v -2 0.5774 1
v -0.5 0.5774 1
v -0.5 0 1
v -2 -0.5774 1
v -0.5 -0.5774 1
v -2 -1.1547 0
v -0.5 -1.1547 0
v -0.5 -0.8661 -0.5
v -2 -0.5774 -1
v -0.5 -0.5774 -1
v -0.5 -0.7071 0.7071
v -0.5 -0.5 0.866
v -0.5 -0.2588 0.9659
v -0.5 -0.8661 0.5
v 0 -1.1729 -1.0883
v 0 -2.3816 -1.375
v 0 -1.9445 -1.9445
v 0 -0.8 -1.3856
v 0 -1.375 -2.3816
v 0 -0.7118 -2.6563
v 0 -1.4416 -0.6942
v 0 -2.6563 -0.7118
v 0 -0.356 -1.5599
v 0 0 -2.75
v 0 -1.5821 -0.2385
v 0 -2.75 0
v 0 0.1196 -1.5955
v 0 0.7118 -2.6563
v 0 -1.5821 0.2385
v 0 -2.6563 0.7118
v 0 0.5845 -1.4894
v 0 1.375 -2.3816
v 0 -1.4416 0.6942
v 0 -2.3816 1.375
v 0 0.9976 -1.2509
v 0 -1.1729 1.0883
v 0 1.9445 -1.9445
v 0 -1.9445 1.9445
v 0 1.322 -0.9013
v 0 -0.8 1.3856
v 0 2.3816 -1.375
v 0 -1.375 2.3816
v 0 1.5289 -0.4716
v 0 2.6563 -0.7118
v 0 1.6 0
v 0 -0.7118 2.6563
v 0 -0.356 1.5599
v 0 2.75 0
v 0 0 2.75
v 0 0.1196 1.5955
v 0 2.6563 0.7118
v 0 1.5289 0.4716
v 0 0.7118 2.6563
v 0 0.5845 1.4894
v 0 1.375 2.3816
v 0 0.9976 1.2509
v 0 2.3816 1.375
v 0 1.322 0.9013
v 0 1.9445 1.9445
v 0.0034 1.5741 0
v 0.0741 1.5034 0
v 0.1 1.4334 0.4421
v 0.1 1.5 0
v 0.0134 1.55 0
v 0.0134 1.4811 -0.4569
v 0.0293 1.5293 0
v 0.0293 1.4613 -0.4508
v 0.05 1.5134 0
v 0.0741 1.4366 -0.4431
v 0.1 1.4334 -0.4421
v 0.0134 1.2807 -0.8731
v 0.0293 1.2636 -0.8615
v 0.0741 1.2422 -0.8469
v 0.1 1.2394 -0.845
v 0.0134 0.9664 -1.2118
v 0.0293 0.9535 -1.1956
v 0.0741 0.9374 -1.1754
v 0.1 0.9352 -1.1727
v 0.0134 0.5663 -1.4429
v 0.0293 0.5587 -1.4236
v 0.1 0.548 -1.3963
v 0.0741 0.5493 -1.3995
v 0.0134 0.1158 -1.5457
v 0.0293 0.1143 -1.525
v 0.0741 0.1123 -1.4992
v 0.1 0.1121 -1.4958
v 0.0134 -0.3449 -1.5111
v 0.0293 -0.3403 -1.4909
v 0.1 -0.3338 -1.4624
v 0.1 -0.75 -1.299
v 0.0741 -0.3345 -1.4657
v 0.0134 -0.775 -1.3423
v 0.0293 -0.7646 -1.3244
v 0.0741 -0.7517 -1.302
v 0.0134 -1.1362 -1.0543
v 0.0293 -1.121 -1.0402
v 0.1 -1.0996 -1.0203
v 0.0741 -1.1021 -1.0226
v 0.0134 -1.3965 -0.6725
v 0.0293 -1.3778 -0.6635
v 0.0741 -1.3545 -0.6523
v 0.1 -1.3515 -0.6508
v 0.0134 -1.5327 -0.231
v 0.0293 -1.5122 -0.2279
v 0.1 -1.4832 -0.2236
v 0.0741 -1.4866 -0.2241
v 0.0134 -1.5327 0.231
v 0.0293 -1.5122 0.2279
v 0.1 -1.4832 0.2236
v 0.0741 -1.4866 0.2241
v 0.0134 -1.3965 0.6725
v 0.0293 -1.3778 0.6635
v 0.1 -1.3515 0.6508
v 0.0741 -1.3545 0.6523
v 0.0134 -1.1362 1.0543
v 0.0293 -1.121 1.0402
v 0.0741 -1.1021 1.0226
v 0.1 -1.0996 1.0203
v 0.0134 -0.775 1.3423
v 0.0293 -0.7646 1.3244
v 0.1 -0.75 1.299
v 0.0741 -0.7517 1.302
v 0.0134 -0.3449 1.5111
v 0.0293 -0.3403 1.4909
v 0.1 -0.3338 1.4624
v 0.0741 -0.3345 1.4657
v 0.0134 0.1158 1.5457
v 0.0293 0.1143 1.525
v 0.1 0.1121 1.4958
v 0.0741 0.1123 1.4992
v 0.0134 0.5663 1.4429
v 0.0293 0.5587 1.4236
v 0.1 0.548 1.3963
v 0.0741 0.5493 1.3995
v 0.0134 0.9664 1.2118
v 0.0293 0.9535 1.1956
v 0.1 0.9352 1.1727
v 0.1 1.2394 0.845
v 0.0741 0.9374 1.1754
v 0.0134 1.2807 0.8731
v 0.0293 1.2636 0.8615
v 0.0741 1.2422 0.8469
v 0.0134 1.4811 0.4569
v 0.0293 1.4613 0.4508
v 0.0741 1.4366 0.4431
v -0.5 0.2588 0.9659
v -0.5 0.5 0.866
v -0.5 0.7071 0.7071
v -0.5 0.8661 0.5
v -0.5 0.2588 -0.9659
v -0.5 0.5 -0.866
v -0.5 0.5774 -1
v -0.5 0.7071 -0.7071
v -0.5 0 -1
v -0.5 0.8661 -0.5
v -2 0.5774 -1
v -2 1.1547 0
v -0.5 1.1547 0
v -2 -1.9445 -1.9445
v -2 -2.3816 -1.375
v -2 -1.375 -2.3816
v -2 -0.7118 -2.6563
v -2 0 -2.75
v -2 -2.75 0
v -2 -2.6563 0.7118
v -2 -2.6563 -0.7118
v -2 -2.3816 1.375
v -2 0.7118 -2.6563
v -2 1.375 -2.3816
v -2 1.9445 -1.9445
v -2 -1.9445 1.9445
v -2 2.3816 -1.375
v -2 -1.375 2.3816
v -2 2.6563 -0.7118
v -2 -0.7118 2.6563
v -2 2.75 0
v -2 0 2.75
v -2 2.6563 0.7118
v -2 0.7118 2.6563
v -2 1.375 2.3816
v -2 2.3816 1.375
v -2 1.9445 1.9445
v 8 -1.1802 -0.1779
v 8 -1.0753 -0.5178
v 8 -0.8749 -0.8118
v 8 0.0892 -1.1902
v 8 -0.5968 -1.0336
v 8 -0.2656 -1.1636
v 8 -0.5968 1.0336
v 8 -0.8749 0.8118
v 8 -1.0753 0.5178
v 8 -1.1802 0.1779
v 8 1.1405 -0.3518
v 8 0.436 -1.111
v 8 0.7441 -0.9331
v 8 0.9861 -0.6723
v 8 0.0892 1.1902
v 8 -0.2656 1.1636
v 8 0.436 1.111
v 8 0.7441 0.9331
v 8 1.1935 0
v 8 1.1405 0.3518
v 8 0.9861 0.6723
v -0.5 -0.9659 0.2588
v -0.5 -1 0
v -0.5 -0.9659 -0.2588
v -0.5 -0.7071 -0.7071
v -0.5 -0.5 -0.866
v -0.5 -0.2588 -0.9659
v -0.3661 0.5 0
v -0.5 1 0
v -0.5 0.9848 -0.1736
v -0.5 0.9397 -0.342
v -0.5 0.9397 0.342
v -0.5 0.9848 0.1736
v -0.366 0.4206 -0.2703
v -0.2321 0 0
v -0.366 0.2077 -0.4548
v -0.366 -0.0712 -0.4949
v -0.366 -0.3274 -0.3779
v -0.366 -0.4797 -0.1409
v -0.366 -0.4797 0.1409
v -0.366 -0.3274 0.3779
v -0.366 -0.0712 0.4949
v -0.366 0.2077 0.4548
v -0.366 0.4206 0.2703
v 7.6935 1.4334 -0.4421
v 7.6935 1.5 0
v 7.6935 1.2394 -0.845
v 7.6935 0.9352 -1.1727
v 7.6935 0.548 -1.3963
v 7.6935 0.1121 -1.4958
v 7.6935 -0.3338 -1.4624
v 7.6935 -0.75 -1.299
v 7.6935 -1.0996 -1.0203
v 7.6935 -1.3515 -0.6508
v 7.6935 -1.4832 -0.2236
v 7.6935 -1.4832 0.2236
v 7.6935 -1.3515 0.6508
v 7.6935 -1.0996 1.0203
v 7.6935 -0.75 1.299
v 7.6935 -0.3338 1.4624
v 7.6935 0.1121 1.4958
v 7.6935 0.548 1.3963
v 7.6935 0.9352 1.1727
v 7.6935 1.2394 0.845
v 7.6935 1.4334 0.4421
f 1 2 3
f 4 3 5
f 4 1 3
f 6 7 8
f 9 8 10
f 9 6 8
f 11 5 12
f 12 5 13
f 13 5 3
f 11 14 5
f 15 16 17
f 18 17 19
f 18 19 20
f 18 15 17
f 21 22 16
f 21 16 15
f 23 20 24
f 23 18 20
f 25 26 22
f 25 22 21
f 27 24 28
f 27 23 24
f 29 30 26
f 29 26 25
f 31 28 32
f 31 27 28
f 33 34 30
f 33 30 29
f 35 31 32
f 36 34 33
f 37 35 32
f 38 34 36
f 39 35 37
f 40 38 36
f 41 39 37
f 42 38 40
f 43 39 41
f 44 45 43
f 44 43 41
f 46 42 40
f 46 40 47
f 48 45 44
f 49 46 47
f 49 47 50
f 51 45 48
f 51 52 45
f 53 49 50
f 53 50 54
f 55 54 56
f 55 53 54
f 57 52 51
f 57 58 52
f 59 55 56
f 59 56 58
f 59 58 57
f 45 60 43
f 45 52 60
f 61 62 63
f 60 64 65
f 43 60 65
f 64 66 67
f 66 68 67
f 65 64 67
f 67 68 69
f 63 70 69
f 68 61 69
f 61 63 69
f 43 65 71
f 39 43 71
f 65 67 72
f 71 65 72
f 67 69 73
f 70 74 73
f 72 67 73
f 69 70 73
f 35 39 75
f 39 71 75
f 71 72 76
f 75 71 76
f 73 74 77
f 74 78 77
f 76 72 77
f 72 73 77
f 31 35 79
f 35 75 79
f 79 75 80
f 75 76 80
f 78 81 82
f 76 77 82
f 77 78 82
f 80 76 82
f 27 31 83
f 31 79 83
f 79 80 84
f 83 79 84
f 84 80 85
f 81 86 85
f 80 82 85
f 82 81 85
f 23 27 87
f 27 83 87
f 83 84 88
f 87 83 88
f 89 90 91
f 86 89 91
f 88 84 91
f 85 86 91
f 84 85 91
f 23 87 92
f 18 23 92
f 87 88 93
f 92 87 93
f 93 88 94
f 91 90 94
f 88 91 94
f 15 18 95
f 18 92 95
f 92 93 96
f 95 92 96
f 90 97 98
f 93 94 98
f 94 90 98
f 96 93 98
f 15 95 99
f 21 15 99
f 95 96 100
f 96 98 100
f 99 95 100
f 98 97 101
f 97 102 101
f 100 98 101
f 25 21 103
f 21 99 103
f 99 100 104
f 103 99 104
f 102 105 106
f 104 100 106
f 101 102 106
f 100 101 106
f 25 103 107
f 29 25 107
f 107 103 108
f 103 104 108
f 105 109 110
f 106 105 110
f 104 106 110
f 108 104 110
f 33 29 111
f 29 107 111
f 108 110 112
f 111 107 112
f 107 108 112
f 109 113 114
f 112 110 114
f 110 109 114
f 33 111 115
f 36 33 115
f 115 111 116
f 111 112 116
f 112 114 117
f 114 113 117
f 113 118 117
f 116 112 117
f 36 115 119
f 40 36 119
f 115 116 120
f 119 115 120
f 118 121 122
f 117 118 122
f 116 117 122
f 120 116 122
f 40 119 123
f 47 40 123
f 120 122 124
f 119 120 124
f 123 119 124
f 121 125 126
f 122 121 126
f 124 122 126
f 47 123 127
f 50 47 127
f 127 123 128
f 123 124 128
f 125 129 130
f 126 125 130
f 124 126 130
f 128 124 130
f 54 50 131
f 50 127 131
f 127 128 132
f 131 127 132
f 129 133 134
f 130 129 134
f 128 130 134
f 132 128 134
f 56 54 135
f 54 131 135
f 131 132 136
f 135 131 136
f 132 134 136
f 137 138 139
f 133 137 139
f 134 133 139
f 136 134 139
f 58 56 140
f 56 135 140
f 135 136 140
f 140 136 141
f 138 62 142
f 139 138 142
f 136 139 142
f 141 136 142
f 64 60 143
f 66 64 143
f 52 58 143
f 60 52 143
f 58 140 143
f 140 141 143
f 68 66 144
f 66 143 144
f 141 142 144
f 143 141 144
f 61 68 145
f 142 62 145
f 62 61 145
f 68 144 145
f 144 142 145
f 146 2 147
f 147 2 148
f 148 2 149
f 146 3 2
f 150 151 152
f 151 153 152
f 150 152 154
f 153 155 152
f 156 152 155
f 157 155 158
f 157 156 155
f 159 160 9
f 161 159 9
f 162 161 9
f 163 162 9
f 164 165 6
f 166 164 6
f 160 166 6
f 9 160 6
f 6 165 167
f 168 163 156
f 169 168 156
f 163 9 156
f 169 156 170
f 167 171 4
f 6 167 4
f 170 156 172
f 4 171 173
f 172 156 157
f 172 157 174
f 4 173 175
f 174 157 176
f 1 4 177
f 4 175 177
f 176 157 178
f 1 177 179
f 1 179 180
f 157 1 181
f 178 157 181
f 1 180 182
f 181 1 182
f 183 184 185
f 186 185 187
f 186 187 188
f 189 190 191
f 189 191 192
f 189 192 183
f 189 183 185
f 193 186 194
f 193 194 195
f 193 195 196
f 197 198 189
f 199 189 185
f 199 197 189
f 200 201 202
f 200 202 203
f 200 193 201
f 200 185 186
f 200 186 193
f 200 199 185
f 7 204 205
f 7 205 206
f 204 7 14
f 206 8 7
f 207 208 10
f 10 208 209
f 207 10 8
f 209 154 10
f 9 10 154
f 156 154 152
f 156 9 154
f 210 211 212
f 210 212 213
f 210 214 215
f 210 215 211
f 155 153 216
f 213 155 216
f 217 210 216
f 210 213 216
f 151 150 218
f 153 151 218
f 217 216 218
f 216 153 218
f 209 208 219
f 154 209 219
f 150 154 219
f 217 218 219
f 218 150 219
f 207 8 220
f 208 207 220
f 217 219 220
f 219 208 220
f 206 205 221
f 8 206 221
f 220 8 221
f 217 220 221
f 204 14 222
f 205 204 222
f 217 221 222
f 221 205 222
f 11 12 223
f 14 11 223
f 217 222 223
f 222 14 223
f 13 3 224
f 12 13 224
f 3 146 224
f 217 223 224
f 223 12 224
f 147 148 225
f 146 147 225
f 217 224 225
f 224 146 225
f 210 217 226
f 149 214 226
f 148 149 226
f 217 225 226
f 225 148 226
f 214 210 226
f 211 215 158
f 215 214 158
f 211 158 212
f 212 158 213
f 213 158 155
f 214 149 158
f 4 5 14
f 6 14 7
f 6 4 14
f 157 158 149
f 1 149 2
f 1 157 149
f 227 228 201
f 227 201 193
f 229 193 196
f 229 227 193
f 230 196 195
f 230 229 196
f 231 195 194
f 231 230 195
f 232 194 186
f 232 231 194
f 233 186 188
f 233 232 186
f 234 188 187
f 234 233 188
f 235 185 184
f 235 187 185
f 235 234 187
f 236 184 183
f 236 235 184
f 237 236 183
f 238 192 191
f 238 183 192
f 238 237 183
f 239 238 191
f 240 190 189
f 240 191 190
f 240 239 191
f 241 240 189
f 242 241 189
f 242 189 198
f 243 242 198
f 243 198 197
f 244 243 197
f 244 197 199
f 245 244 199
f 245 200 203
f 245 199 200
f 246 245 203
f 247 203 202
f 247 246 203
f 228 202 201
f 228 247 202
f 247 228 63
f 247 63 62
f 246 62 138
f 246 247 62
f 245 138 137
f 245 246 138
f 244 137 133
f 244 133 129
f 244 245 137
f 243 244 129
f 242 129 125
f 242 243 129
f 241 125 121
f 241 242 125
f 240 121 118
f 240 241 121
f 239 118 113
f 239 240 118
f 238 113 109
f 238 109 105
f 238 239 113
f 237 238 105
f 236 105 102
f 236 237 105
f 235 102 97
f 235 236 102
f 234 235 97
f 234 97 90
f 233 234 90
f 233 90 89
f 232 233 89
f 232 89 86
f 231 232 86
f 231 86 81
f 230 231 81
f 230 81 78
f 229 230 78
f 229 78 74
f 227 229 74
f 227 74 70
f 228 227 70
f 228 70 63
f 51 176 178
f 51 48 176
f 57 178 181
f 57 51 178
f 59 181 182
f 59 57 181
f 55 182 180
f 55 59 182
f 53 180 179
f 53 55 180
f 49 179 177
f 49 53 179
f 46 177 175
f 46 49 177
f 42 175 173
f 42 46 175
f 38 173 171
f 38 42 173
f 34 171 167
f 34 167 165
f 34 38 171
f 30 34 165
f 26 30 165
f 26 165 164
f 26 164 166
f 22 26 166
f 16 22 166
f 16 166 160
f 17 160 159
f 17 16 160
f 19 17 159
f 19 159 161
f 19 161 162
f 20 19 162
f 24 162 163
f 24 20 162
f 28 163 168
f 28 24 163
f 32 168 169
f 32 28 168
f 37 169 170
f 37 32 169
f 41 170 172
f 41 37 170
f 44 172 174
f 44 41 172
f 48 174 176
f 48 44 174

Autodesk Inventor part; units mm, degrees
ref_plane "YZ Plane" through (0, 0, 0) normal (1, 0, 0) x (0, 1, 0)
ref_plane "XZ Plane" through (0, 0, 0) normal (0, 1, 0) x (-1, 0, 0)
ref_plane "XY Plane" through (0, 0, 0) normal (0, 0, 1) x (1, 0, 0)
sketch "Sketch_1" plane through (0, 0, 0) normal (0, 0, 1) x (1, 0, 0)
  line L0 (8, 0) -> (-0.2321, 0)
  line L1 (-0.2321, 0) -> (-0.5, 1)
  line L2 (-0.5, 1) -> (-2, 1)
  line L3 (-2, 1) -> (-2, 2.75)
  line L4 (-2, 2.75) -> (0, 2.75)
  line L5 (0, 2.75) -> (0, 1.6)
  arc A0 (0, 1.6) -> (0.1, 1.5) centre (0.1, 1.6) ccw
  line L6 (0.1, 1.5) -> (7.6935, 1.5)
  line L7 (7.6935, 1.5) -> (8, 1.1935)
  line L8 (8, 1.1935) -> (8, 0)
  line L9 (8, 0) -> (-0.2321, 0)
revolve "Revolution1" add sketch "Sketch_1" angle 360 about axis through (8, 0, 0) along (1, 0, 0)
thread "Thread1" size "M3x0.5" class "6g" standard "ANSI Metric M Profile" length 7.0626
sketch "Sketch_2" plane through (-2, 0, 0) normal (1, 0, 0) x (0, 0, -1)
  line L0 (-1, -0.5774) -> (0, -1.1547)
  line L1 (0, -1.1547) -> (1, -0.5774)
  line L2 (1, -0.5774) -> (1, 0.5774)
  line L3 (1, 0.5774) -> (0, 1.1547)
  line L4 (0, 1.1547) -> (-1, 0.5774)
  line L5 (-1, 0.5774) -> (-1, -0.5774)
extrude "Extrusion1" cut sketch "Sketch_2" along normal blind 1.5
properties part number "CBSH3-8" material "鋼"
